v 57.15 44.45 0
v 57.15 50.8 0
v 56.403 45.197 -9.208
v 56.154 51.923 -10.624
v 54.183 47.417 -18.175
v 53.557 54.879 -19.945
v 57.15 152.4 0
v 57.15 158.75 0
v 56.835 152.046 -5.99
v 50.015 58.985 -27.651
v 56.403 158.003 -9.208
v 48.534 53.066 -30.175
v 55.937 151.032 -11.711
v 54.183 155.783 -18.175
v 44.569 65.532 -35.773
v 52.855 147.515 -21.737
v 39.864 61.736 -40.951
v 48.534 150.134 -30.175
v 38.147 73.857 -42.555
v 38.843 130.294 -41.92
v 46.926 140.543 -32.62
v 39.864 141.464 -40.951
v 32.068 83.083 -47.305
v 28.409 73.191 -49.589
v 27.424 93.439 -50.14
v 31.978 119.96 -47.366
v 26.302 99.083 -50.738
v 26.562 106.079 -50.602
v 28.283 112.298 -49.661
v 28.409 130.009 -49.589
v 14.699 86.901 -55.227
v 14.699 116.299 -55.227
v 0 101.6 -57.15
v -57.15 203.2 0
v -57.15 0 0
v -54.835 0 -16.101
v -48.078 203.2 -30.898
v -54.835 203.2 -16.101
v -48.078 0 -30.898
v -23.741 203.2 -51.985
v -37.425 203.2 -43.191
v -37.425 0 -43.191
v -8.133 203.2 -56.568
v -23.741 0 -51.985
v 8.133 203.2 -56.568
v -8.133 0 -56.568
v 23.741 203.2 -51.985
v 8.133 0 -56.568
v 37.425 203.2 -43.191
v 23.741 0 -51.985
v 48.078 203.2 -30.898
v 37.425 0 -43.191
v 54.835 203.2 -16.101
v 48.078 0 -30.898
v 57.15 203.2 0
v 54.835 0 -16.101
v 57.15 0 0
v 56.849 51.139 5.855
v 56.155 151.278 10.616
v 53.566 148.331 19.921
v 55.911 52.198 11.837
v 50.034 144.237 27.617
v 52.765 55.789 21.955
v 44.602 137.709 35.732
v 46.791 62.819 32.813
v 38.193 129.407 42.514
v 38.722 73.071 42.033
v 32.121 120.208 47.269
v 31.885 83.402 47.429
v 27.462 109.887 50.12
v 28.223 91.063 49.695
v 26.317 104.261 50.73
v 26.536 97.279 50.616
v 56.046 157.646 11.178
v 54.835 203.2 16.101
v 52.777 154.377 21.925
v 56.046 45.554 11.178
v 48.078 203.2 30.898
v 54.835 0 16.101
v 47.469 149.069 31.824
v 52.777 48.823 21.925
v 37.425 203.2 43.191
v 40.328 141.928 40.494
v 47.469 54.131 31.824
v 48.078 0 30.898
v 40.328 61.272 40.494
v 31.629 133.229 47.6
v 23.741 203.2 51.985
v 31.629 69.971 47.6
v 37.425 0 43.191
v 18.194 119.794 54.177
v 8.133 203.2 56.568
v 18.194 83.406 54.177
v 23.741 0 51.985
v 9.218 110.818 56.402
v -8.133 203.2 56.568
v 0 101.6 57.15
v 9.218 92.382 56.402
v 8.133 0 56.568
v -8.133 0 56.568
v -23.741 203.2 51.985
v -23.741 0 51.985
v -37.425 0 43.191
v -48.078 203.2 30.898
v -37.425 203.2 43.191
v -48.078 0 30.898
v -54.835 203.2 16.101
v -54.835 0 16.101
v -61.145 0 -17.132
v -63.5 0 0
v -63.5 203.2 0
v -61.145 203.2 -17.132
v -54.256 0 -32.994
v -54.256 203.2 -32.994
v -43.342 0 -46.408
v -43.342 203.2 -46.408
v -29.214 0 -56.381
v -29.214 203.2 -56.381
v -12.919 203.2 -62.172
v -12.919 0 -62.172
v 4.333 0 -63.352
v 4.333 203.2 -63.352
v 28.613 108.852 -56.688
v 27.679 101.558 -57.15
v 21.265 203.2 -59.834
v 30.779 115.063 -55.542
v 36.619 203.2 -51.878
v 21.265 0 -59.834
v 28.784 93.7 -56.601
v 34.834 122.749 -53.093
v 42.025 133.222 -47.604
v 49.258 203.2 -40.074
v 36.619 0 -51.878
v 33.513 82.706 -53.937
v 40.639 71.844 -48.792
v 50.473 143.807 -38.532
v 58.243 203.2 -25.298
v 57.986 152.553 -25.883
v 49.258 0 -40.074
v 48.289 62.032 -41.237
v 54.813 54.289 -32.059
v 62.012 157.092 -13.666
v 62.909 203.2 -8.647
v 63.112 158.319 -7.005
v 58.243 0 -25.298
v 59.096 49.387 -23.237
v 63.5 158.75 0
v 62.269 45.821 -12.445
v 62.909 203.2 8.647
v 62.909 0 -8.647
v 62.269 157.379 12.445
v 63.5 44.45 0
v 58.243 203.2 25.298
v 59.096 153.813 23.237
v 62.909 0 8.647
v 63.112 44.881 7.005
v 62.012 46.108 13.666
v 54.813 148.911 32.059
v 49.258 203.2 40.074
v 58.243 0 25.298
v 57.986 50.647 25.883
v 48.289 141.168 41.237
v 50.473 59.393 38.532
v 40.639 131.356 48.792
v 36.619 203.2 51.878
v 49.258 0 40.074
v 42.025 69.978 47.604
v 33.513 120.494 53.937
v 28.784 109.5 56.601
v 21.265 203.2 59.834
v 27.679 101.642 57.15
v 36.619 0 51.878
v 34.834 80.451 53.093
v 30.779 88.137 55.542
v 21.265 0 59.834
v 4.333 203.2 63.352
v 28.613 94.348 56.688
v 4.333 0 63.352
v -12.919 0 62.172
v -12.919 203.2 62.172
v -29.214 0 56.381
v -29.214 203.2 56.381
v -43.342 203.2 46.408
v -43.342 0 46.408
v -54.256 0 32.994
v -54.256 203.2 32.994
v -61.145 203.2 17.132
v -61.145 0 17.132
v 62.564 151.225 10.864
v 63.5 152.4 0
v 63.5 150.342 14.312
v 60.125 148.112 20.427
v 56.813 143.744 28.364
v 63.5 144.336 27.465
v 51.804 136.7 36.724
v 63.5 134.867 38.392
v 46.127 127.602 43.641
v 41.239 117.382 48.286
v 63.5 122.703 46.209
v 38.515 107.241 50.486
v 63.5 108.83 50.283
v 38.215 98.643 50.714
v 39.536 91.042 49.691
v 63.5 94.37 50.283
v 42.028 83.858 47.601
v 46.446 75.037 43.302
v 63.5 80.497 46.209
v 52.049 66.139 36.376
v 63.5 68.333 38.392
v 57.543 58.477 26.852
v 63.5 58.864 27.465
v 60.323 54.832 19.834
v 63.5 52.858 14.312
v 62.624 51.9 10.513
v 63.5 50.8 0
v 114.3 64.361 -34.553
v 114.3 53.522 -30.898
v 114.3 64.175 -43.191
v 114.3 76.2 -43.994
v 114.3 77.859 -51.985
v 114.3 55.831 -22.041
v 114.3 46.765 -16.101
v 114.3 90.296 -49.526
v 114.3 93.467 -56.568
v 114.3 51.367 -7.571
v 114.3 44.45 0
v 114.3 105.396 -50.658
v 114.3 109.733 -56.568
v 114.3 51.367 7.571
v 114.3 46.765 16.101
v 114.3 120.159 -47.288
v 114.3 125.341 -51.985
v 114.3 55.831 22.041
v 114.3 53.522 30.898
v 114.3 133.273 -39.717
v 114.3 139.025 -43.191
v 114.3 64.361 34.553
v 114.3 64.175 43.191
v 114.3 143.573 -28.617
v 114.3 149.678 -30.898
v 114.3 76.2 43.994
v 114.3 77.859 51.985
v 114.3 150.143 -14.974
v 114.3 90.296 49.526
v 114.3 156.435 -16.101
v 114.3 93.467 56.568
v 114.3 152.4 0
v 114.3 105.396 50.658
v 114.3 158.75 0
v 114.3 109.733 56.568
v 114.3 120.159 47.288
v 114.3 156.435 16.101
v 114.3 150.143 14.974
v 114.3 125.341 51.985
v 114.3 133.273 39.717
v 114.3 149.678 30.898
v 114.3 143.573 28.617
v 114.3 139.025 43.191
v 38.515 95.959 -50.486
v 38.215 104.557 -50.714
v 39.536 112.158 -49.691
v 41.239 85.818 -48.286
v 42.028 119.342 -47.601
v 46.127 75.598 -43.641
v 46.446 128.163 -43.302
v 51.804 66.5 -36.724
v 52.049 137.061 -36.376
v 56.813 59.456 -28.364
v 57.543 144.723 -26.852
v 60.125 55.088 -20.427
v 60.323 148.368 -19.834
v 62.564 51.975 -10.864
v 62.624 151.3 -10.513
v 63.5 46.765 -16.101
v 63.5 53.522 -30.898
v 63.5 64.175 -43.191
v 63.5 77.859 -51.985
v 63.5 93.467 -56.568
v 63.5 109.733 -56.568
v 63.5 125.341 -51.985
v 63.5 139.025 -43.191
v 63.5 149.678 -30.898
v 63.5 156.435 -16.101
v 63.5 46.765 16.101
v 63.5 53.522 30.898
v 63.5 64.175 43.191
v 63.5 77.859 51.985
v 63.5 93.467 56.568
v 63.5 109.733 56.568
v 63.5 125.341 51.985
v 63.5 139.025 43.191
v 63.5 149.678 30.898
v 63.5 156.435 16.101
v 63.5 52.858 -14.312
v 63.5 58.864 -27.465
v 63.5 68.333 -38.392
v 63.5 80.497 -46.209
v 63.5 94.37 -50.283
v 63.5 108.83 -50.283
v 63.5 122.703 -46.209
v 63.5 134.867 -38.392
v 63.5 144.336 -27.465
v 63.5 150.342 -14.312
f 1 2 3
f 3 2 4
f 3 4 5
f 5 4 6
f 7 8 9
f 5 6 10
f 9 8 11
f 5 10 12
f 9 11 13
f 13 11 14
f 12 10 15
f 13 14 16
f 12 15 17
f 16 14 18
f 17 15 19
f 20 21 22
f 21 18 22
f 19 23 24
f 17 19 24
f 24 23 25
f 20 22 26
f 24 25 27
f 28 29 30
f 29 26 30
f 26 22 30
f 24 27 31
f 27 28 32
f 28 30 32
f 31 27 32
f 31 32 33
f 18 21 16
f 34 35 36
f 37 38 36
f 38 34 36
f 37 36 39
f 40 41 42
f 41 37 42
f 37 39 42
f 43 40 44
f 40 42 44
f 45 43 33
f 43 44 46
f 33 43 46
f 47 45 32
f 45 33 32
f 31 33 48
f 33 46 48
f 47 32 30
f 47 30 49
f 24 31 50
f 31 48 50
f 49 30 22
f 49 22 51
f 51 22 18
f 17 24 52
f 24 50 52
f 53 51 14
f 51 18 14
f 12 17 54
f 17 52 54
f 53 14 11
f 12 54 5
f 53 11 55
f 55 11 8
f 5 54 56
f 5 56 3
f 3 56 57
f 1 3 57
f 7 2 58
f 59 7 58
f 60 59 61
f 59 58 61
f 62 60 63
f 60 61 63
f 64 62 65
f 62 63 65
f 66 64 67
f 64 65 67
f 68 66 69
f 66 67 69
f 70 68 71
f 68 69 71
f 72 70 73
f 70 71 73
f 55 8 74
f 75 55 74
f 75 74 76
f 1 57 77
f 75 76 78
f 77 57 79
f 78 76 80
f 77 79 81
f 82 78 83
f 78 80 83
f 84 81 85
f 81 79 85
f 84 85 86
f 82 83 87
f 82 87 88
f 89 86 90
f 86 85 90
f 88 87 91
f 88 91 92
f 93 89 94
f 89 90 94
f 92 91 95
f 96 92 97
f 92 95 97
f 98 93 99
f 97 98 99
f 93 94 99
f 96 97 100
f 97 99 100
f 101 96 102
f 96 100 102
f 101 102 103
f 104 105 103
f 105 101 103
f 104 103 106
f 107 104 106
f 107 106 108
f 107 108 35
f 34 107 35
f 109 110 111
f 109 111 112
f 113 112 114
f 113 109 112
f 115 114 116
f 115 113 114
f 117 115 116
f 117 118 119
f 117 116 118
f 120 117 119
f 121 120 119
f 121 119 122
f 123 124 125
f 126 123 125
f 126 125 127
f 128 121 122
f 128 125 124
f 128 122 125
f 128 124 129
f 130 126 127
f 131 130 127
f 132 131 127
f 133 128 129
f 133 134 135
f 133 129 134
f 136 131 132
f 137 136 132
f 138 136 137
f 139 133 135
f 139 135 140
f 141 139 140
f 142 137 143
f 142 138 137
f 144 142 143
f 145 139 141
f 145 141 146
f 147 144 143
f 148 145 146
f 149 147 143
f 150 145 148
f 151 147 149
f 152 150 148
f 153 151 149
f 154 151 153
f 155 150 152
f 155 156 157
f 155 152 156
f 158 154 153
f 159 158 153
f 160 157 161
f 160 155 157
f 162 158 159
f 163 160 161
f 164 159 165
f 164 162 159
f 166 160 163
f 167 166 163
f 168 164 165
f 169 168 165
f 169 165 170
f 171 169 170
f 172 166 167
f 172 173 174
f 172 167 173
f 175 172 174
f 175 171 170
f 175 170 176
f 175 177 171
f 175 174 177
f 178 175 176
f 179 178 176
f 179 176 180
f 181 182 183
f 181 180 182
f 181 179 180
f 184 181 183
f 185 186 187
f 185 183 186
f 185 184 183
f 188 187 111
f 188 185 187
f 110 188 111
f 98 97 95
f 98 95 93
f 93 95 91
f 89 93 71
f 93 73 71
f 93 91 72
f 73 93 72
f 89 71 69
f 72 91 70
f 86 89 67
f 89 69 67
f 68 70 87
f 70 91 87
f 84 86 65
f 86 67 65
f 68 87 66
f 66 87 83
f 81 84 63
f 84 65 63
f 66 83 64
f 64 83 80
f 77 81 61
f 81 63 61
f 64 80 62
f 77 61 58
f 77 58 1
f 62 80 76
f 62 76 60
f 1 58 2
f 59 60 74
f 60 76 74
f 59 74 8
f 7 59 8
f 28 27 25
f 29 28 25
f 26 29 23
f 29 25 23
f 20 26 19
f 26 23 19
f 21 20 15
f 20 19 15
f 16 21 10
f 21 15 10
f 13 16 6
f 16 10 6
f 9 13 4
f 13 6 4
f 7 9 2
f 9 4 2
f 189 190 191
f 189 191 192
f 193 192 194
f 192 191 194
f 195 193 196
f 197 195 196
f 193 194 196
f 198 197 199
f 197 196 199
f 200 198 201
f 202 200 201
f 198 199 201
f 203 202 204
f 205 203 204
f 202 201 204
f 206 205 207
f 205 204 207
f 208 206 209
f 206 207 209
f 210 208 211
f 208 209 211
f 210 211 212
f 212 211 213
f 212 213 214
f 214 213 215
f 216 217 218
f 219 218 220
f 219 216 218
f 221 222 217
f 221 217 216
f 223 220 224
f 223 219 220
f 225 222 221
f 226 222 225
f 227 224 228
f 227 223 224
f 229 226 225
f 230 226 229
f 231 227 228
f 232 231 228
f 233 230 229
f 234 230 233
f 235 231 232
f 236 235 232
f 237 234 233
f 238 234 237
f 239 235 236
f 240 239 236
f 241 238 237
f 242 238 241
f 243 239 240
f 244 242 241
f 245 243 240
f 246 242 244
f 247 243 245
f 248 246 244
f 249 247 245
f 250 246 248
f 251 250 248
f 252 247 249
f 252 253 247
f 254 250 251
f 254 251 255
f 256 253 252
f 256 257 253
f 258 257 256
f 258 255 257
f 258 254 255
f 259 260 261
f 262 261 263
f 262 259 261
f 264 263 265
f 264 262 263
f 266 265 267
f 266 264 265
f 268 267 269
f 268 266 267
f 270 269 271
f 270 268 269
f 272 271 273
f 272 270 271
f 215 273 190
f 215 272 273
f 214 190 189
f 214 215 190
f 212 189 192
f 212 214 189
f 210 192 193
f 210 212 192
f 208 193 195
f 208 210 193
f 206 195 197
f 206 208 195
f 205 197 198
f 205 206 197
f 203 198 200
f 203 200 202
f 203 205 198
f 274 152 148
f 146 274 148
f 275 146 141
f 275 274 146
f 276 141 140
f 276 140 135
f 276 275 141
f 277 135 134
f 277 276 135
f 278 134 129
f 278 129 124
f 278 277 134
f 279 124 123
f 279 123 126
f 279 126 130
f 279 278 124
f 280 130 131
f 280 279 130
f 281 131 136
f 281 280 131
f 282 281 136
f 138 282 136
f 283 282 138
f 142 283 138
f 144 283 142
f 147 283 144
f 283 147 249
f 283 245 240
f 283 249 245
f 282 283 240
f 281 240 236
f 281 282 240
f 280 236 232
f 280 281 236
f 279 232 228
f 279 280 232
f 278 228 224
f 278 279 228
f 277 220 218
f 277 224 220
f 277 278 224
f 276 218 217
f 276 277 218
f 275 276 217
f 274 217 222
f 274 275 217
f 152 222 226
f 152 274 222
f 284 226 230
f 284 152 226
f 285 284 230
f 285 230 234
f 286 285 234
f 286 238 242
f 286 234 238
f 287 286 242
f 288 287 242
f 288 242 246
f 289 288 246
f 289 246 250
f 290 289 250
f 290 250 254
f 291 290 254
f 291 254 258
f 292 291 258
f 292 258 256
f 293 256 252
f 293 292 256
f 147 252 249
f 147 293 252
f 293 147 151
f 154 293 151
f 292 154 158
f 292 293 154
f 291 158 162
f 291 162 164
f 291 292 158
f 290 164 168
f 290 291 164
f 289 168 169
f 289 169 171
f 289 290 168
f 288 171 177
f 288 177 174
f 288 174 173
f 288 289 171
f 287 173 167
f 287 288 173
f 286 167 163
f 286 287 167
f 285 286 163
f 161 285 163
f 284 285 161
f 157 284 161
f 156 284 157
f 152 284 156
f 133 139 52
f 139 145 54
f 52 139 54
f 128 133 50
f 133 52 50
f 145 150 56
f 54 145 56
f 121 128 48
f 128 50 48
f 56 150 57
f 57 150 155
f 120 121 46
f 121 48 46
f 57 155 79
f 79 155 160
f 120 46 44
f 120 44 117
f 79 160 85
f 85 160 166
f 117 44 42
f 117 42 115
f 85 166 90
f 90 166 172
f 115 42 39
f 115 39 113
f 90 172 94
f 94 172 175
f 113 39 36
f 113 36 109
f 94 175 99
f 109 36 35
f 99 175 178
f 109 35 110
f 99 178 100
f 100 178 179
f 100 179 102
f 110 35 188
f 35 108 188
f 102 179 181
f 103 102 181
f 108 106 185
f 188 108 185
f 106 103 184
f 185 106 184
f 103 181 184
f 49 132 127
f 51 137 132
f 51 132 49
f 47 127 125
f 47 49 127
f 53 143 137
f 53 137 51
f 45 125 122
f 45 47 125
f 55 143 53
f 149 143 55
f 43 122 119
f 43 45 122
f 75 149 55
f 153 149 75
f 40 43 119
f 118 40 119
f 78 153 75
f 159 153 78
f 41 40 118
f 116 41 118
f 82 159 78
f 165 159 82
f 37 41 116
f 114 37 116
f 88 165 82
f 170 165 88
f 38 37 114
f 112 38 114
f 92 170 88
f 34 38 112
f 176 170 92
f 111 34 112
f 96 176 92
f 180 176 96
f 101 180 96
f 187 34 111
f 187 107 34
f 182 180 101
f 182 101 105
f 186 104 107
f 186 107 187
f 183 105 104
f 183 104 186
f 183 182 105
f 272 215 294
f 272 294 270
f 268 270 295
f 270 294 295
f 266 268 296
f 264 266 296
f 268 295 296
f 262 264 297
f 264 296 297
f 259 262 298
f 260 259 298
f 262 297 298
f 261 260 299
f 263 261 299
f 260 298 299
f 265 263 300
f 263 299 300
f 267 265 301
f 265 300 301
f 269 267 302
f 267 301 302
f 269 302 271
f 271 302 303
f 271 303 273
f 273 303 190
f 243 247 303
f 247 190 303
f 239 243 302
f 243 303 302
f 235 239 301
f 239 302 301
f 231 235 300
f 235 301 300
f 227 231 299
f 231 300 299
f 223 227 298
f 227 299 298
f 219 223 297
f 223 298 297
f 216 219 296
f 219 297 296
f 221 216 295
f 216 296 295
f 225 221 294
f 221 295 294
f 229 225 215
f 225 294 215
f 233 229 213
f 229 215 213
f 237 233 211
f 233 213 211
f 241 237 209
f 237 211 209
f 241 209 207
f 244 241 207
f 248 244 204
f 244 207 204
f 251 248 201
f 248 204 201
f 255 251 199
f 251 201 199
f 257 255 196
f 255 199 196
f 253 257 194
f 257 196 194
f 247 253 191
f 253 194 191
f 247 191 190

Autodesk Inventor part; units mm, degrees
ref_plane "XZ Plane" through (0, 0, 0) normal (0, 1, 0) x (-1, 0, 0)
ref_plane "XY Plane" through (0, 0, 0) normal (0, 0, 1) x (1, 0, 0)
sketch "Sketch1" plane through (0, 0, 0) normal (0, 1, 0) x (-1, 0, 0)
  circle A0 centre (0, 0) radius 57.15
  circle A1 centre (0, 0) radius 63.5
  dimension "d0" = 114.3
  dimension "d1" = 6.35
extrude "Extrusion1" add sketch "Sketch1" along normal blind 203.2
ref_plane "Work Plane1" through (63.5, 0, 0) normal (1, 0, 0) x (0, 1, 0)
sketch "Sketch2" plane through (63.5, 0, 0) normal (1, 0, 0) x (0, 1, 0)
  circle A0 centre (101.6, 0) radius 57.15
  circle A1 centre (101.6, 0) radius 50.8
  point P0 (0, 0)
  dimension "d4" = 101.6
  dimension "d5" = 114.3
  dimension "d6" = 101.6
extrude "Extrusion2" add sketch "Sketch2" along normal blind 50.8 and the other way blind 63.5
sketch "Sketch3" plane through (0, 203.2, 0) normal (0, 1, 0) x (1, 0, 0)
  circle A0 centre (0, 0) radius 57.15 projected
extrude "Extrusion3" cut sketch "Sketch3" against normal blind 254
properties part number "T Junction"
